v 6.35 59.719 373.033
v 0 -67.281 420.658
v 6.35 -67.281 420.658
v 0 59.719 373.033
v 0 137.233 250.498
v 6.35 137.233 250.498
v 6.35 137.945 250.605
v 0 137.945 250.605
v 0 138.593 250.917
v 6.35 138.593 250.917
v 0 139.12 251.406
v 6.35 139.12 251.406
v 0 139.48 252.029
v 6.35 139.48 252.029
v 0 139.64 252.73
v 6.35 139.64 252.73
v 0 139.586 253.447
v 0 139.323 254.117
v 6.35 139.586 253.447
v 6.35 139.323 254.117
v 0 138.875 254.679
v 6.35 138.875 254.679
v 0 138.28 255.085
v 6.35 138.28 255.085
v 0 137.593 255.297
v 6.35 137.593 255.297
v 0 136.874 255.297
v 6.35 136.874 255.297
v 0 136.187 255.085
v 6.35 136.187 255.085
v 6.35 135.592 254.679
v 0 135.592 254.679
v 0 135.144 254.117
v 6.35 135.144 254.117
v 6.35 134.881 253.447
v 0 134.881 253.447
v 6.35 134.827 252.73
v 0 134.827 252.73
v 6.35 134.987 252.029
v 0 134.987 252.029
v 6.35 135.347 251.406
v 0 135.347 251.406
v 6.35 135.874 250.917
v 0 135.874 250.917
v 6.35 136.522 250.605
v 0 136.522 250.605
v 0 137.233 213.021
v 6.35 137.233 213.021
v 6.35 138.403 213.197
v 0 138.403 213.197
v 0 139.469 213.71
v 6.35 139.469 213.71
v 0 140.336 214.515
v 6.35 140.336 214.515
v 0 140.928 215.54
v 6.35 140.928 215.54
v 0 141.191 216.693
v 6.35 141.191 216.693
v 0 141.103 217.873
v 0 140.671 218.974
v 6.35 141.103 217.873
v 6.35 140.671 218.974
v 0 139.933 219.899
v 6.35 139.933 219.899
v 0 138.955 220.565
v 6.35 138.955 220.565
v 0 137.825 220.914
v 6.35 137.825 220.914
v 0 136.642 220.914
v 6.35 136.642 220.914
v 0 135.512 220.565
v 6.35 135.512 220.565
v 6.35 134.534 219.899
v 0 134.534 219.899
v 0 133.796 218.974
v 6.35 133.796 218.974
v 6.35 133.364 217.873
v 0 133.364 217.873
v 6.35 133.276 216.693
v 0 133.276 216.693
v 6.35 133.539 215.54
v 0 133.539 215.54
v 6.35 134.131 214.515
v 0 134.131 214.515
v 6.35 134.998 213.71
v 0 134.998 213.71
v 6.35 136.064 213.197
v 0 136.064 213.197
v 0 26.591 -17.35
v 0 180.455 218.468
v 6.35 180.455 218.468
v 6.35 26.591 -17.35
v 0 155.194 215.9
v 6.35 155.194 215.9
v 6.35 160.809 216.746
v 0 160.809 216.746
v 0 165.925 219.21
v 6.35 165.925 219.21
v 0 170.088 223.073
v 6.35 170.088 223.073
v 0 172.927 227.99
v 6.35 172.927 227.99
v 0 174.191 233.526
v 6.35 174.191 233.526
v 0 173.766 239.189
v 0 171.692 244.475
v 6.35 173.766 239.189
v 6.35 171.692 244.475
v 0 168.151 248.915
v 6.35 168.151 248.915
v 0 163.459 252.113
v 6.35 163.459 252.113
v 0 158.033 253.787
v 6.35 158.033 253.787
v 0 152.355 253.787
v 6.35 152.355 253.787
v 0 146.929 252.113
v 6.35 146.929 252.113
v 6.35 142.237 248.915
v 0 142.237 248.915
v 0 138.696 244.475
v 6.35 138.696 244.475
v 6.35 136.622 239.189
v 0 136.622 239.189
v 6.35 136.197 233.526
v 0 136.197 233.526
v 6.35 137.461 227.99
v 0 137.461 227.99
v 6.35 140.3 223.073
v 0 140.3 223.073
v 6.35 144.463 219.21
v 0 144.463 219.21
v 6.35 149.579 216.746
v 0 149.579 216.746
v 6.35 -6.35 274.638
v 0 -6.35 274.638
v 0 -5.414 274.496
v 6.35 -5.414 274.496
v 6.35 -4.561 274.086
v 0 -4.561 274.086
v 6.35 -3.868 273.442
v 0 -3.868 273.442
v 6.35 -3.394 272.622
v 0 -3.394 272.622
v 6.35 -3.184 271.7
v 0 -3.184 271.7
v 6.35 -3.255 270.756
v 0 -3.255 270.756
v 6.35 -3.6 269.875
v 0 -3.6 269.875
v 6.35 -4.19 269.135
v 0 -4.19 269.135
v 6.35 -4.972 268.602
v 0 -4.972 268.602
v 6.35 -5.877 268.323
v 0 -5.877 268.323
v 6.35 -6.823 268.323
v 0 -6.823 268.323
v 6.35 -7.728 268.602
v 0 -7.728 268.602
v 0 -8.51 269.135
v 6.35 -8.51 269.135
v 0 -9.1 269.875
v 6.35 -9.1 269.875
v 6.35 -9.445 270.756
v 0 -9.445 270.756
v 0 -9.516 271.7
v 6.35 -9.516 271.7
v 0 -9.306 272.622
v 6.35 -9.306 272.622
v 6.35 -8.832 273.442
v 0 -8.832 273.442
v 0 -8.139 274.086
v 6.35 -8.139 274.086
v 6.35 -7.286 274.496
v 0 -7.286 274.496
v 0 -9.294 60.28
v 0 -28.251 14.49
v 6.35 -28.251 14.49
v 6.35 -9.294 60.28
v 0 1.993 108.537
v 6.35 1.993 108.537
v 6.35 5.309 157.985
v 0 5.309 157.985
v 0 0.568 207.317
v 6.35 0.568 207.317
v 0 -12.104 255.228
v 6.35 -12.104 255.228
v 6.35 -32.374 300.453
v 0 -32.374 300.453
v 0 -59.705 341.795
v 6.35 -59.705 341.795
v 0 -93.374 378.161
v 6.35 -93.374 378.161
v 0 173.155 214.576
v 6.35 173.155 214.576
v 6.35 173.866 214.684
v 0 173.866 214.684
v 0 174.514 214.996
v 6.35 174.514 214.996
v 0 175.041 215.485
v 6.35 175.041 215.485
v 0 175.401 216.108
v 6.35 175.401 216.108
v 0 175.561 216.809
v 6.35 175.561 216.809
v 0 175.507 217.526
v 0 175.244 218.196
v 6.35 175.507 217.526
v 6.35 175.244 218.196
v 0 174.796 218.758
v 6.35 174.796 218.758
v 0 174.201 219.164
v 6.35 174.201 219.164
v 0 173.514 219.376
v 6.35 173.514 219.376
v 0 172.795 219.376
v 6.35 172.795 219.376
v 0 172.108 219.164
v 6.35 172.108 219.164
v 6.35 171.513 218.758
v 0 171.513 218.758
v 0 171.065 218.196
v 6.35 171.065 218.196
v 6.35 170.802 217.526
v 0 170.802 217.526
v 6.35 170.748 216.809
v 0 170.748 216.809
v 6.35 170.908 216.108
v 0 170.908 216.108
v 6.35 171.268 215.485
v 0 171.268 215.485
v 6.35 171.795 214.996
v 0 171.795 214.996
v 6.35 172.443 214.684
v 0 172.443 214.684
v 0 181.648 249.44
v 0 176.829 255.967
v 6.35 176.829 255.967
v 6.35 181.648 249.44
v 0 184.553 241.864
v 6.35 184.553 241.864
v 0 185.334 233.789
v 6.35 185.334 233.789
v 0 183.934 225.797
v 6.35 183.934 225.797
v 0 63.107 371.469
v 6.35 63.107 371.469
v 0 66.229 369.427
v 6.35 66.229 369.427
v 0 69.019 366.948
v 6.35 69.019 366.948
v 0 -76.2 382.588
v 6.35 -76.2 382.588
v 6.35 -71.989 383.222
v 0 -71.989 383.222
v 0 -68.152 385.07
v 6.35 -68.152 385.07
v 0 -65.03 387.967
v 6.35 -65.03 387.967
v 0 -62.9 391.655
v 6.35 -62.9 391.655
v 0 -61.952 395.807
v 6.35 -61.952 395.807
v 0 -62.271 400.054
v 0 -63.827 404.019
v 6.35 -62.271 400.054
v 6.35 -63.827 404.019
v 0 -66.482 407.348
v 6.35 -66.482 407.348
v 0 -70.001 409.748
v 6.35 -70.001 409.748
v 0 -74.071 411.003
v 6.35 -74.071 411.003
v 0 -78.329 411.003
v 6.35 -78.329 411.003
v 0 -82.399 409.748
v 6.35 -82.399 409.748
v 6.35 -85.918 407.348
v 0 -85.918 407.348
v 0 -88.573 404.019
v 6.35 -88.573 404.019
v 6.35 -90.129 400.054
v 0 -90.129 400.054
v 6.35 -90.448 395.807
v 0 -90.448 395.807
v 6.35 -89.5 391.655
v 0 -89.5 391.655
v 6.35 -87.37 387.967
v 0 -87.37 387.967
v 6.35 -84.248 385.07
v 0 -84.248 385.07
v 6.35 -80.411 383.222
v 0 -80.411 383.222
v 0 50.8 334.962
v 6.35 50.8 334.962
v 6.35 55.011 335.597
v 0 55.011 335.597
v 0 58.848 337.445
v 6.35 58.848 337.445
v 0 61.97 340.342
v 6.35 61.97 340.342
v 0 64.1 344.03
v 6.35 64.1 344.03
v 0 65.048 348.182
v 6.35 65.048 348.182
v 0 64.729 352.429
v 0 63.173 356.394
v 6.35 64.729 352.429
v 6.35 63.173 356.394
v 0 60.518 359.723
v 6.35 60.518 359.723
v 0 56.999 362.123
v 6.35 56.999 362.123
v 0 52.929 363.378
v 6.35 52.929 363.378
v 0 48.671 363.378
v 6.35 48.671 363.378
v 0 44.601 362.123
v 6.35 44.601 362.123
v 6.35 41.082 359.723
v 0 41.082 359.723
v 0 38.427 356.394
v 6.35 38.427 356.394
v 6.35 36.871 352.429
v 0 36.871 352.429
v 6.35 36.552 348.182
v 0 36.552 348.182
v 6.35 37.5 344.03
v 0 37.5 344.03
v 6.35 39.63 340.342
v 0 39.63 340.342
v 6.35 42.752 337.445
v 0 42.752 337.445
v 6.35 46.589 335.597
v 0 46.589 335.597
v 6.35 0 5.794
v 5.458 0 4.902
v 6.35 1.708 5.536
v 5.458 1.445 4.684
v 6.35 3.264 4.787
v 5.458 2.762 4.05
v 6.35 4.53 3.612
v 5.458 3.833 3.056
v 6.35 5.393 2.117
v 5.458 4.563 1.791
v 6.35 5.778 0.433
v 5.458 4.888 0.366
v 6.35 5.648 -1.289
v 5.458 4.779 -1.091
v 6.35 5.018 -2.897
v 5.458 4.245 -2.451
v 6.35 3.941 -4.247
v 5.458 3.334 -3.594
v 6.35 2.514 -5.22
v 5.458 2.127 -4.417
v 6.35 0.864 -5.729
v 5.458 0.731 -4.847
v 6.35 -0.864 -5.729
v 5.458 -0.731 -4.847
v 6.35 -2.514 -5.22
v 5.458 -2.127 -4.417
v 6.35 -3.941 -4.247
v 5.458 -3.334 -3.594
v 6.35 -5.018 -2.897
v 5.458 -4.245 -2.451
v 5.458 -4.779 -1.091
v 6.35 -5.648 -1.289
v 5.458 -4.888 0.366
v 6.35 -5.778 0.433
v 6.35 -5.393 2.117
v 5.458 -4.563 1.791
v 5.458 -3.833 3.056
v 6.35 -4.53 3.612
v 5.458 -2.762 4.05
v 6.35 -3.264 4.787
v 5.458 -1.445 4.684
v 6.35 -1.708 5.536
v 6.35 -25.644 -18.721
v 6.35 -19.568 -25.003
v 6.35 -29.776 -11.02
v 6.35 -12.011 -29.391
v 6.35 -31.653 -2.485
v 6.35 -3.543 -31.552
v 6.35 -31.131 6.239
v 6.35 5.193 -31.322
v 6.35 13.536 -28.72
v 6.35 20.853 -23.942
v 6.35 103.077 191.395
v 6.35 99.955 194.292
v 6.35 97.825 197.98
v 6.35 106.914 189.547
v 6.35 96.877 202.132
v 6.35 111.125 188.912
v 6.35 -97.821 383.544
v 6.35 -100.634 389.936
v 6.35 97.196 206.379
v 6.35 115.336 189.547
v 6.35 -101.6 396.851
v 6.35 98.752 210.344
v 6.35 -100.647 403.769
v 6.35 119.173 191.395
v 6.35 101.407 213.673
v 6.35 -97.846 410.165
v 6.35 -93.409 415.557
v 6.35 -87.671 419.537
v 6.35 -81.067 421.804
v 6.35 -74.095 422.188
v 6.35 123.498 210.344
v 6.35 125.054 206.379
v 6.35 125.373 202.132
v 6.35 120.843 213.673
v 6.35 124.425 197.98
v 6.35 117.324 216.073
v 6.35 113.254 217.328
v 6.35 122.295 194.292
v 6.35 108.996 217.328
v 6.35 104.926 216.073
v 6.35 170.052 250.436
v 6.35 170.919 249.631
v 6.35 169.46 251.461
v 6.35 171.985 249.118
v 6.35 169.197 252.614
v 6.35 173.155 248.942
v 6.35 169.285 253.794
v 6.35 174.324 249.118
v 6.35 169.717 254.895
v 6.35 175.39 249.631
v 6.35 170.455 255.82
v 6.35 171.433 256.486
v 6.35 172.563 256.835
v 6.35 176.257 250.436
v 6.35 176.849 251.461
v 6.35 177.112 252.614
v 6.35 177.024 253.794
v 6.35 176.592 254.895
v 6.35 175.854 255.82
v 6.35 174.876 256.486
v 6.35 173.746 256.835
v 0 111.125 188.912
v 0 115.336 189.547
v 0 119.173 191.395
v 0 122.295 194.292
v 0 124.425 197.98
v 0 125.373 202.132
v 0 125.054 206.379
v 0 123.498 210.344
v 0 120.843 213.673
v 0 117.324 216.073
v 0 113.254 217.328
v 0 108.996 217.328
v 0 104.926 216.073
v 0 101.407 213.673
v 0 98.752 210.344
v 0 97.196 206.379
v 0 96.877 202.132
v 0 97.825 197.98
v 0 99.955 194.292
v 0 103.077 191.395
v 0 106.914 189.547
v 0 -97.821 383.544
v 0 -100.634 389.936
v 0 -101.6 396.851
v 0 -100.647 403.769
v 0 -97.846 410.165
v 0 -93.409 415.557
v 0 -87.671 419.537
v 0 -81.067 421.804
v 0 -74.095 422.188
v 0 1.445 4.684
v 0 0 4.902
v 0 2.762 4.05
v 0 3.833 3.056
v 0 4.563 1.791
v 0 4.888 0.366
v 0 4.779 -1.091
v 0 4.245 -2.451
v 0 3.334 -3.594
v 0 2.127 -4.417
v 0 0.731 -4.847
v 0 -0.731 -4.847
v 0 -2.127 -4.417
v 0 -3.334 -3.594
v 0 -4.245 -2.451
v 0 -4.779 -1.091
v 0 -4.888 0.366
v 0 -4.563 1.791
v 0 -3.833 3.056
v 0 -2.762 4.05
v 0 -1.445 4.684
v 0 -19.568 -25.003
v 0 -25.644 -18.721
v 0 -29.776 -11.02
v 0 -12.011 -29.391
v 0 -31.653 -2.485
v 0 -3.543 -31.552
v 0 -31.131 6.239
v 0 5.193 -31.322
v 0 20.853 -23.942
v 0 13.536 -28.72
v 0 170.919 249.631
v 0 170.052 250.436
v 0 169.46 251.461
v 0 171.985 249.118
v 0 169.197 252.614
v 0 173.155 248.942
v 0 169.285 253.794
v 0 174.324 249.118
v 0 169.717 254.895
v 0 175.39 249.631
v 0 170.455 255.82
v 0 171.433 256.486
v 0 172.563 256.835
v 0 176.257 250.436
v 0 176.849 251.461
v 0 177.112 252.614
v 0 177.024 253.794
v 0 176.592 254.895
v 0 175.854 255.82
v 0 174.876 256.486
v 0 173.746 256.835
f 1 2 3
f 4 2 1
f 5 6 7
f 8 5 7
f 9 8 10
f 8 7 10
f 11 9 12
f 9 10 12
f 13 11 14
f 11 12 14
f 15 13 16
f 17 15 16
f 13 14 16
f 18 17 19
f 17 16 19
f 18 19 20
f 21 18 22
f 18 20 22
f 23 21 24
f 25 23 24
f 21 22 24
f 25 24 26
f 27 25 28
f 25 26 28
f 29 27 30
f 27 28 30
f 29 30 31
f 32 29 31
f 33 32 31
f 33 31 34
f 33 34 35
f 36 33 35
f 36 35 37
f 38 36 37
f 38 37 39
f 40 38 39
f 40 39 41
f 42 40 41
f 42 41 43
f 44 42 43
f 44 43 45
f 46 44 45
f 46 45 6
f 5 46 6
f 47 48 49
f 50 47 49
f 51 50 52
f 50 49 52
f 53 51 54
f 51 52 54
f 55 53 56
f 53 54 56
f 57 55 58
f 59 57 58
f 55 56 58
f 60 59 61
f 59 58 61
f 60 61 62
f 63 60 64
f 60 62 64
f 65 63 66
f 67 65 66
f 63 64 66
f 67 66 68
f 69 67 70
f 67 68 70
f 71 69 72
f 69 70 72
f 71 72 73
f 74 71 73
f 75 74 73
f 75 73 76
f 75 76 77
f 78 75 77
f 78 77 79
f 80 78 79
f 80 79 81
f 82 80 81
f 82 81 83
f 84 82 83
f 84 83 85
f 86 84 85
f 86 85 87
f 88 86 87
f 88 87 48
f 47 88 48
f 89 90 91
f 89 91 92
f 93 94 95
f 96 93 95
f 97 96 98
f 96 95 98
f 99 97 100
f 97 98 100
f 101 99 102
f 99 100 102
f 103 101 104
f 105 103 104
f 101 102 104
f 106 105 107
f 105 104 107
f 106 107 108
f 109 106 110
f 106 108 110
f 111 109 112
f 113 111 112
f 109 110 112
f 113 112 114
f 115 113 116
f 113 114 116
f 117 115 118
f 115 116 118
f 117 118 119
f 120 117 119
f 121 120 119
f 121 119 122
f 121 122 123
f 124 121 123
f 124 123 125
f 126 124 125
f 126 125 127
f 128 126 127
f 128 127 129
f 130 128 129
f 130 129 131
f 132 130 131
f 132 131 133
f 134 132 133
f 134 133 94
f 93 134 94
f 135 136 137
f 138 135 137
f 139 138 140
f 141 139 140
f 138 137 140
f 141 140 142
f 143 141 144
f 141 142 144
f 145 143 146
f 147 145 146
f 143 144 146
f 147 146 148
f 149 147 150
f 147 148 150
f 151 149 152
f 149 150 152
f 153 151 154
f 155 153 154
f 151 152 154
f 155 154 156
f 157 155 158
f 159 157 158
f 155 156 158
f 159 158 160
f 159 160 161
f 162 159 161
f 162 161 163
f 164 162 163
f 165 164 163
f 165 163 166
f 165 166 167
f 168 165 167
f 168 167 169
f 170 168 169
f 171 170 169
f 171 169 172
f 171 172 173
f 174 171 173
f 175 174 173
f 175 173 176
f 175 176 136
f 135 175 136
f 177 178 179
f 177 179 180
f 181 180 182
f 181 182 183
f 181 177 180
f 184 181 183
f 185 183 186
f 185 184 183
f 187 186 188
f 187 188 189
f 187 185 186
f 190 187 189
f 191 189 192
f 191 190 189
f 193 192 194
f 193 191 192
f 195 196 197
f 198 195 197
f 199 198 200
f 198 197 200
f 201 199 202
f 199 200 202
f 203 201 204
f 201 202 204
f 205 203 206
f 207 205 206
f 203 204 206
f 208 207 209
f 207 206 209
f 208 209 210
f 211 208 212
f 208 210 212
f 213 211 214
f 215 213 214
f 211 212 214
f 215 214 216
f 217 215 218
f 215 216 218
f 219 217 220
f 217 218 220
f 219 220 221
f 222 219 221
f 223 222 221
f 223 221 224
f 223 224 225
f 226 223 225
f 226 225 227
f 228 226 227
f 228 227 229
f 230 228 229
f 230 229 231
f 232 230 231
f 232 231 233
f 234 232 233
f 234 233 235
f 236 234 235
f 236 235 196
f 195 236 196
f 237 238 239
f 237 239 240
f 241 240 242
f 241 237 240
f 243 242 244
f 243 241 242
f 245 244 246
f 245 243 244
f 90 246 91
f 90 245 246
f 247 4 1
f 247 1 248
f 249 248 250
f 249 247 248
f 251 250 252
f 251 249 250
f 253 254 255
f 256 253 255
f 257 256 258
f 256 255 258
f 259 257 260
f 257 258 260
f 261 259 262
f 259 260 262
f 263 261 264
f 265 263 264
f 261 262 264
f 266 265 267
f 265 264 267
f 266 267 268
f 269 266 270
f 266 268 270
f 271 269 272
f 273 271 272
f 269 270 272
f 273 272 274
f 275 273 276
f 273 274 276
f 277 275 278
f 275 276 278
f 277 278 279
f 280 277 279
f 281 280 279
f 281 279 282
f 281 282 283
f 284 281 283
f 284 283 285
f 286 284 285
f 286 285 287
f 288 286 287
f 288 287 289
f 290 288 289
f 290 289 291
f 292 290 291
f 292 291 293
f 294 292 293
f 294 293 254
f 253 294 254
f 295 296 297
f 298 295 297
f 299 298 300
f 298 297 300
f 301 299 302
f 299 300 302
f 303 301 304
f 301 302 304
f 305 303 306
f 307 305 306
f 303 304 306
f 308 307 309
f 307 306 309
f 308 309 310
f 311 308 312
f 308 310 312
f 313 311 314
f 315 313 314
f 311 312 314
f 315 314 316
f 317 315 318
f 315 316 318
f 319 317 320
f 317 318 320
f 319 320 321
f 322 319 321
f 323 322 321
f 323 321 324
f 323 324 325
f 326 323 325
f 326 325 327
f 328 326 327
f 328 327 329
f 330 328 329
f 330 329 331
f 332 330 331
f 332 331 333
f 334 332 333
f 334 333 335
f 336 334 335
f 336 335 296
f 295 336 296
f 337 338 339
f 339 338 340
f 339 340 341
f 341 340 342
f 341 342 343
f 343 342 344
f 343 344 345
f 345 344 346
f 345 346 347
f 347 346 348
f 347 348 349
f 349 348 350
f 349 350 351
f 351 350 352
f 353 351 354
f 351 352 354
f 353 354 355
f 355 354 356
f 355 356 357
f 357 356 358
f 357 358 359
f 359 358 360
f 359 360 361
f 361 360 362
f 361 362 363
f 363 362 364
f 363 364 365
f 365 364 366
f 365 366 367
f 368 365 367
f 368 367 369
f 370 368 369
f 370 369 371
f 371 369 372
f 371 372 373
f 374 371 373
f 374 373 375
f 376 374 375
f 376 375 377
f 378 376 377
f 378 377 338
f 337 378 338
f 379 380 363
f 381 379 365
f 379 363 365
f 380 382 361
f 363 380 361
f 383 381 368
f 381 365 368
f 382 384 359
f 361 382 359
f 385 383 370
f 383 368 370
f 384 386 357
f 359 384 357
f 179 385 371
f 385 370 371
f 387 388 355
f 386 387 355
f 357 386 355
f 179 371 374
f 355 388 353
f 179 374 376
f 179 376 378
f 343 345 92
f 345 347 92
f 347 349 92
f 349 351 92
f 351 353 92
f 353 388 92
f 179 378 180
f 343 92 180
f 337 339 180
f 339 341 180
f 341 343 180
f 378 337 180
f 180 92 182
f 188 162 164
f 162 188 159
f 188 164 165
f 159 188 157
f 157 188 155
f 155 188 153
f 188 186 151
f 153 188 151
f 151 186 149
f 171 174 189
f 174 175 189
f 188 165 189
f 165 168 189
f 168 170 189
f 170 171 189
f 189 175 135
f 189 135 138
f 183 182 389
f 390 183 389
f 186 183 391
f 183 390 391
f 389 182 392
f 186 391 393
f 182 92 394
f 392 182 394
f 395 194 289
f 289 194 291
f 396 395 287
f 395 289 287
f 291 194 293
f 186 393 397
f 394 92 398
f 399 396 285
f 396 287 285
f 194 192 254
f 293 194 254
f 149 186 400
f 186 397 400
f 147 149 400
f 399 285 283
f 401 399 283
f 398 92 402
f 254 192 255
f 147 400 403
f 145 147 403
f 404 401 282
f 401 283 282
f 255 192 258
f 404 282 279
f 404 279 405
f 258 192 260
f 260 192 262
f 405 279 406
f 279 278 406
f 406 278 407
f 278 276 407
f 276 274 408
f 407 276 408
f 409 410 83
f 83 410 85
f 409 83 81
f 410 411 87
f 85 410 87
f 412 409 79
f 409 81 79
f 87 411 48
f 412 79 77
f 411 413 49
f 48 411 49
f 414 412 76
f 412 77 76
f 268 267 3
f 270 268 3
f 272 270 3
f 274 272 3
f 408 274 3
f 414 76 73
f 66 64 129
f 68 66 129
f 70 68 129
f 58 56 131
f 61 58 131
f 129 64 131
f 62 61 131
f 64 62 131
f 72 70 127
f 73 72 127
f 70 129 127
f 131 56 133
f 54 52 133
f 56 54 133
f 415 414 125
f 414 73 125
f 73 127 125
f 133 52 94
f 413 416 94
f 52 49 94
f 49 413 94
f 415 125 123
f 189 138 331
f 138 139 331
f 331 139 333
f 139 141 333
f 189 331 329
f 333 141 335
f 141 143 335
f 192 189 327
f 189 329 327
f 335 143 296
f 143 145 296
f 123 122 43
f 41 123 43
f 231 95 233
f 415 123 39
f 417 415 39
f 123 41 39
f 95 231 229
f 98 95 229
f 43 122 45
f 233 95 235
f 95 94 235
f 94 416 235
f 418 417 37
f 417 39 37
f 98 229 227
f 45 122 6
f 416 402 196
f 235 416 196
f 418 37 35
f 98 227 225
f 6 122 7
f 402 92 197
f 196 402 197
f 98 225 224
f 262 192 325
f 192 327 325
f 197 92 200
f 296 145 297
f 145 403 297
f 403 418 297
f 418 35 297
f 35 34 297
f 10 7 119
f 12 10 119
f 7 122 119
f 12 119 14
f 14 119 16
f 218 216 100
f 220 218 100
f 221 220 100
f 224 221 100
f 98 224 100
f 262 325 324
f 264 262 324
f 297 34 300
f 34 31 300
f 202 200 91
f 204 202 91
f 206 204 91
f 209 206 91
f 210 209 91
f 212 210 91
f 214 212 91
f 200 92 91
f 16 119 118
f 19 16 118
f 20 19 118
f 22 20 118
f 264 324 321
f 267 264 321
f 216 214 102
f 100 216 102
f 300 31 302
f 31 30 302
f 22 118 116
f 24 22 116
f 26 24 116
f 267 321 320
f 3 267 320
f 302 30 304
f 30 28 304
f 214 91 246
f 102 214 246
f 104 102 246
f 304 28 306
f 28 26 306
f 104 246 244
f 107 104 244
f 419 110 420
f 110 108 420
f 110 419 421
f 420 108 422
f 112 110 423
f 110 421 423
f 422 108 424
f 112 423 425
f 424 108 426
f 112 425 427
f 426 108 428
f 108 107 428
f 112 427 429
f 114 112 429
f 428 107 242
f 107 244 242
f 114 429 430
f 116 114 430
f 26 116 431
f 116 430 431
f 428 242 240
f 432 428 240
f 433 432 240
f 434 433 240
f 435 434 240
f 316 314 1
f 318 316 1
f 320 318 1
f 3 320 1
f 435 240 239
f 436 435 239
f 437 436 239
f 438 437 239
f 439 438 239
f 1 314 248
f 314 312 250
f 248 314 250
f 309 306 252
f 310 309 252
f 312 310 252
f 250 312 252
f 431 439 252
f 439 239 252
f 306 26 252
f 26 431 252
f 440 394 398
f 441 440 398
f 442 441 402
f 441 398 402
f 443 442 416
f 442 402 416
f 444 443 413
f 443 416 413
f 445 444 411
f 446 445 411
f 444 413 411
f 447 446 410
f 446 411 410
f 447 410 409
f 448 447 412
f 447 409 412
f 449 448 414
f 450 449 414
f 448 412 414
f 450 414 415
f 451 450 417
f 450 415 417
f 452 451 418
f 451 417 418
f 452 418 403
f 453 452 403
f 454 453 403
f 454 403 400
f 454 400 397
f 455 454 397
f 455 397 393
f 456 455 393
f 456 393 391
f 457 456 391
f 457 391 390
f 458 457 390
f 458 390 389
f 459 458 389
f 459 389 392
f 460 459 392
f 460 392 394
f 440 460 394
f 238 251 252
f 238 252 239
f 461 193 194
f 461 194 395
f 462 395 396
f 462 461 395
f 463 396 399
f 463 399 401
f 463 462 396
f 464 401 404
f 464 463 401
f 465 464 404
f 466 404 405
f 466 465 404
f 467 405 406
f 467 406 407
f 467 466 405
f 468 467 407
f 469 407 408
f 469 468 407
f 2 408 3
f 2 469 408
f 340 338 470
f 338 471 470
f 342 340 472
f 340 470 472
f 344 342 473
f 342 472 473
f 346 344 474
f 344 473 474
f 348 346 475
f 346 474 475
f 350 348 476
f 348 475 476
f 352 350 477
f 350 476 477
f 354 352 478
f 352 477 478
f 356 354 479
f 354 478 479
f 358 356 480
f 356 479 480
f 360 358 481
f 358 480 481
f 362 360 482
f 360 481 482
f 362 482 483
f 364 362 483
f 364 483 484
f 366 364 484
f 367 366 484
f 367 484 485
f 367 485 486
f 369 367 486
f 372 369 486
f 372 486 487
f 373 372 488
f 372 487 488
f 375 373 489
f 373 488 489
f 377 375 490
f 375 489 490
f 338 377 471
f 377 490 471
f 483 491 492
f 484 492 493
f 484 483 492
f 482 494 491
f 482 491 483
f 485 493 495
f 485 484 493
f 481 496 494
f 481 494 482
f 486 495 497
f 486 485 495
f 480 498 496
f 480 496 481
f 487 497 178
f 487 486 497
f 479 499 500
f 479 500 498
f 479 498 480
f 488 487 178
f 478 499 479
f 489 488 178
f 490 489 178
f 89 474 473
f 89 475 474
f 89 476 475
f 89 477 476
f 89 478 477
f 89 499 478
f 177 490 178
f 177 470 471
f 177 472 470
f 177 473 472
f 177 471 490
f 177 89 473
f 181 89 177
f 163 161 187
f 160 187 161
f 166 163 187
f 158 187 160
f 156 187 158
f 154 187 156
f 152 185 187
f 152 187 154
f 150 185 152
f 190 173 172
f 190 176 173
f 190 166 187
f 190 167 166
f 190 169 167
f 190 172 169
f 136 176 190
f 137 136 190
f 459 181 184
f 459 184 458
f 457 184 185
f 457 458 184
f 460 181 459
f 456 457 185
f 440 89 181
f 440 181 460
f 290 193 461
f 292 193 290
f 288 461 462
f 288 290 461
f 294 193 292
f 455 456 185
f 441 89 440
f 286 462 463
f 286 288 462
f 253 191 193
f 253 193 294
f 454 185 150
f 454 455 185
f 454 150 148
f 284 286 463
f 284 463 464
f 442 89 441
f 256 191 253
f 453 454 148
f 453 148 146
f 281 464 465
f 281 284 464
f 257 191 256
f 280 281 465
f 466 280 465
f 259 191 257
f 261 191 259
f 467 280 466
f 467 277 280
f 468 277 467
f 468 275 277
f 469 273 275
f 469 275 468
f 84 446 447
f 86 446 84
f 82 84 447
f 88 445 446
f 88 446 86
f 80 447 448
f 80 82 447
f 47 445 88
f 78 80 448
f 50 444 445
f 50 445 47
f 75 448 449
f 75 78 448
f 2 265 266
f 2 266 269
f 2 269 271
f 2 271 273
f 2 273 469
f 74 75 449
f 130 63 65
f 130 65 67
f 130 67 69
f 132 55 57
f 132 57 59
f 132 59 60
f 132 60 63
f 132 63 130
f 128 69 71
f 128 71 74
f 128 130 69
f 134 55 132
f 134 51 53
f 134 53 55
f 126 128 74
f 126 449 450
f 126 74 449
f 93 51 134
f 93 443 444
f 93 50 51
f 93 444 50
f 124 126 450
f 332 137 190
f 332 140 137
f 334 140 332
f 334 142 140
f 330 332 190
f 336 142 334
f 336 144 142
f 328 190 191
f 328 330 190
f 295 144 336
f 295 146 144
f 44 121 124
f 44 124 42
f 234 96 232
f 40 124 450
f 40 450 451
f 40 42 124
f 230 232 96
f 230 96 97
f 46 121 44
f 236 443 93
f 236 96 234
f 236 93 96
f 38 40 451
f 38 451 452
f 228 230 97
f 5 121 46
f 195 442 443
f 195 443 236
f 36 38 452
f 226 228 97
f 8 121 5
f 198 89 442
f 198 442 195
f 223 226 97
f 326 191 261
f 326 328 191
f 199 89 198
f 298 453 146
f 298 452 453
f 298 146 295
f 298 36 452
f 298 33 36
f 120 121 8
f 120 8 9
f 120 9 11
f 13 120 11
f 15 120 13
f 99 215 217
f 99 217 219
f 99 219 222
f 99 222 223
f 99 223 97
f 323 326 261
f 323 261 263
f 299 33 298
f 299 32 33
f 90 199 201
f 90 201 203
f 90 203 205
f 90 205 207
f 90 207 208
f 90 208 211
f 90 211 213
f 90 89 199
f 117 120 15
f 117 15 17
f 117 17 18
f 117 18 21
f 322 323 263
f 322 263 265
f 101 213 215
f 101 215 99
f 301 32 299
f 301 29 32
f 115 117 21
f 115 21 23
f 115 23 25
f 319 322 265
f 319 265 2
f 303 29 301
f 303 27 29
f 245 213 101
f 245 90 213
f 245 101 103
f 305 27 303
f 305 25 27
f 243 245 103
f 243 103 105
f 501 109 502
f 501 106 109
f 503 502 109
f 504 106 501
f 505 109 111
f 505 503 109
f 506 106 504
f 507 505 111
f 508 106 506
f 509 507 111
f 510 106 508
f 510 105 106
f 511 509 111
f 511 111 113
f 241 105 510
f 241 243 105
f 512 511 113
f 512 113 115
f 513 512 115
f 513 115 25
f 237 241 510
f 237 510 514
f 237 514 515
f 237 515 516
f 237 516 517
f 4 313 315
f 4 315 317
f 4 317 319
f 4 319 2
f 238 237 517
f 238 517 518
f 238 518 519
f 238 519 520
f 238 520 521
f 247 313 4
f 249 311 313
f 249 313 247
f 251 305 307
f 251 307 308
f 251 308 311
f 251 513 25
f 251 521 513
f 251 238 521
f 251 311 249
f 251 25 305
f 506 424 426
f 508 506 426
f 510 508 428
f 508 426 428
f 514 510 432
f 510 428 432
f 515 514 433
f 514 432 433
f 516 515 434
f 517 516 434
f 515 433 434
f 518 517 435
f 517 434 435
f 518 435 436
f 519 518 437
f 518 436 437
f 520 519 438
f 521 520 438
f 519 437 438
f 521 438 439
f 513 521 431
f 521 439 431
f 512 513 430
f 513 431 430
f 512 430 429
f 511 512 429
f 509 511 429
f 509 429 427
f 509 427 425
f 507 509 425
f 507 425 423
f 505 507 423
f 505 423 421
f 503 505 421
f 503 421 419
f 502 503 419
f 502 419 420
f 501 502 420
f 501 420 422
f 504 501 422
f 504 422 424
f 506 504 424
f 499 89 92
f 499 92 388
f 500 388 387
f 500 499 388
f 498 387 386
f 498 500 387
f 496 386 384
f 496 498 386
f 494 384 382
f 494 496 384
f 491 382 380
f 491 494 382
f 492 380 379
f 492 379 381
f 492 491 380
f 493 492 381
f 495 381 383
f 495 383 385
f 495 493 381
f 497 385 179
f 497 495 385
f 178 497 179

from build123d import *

# Parameters (mm, degrees)
BOSS_EXTRUDE1_DEPTH               = 6.35
CUT_EXTRUDE1_REACH                = 463.209
SKETCH3_R                         = 14.2875
SKETCH3_R_2                       = 19.05
SKETCH3_R_3                       = 2.413
SKETCH3_R_4                       = 3.96875
F_3_8_CLEARANCE_HOLE2_D           = 9.8044
F_3_8_CLEARANCE_HOLE2_CSINK_D     = 11.58748
F_3_8_CLEARANCE_HOLE2_CSINK_ANGLE = 90
F_1_4_0_2500_DOWEL_HOLE2_D        = 6.35


with BuildPart() as part:
    # Sketch2 → Boss-Extrude1 (new body)
    with BuildSketch(Plane(origin=(0, 0, 0), x_dir=(0, 0, -1), z_dir=(1, 0, 0))):
        with BuildLine():
            Line((-420.65776111, -67.281464584), (-373.03276111, 59.718535416))
            ThreePointArc((-373.03276111, 59.718535416), (-370.505449055, 64.705606261), (-366.948304567, 69.018946606))
            Line((-366.948304567, 69.018946606), (-255.966736674, 176.828999095))
            ThreePointArc((-255.966736674, 176.828999095), (-237.853043868, 185.216470627), (-218.467902472, 180.454975186))
            Line((-218.467902472, 180.454975186), (17.349576345, 26.590500195))
            ThreePointArc((17.349576345, 26.590500195), (27.457947121, -15.941255906), (-14.489671706, -28.250874568))
            ThreePointArc((-14.489671706, -28.250874568), (-207.31672278, 0.568286884), (-378.160809237, -93.373790032))
            ThreePointArc((-378.160809237, -93.373790032), (-410.165032474, -97.845670164), (-420.65776111, -67.281464584))
        make_face()
    extrude(amount=BOSS_EXTRUDE1_DEPTH)

    # Sketch3 → Cut-Extrude1 (cut, up to next)
    with BuildSketch(Plane(origin=(6.35, 0, 0), x_dir=(0, 0, -1), z_dir=(1, 0, 0)), mode=Mode.PRIVATE) as cut_extrude1_sk1:
        with Locations((-203.2, 111.125)):
            Circle(SKETCH3_R)
    cut_extrude1_tool1 = extrude(cut_extrude1_sk1.sketch, amount=-CUT_EXTRUDE1_REACH, mode=Mode.PRIVATE) & part.part
    # Sketch3 → Cut-Extrude1 (cut, up to next)
    with BuildSketch(Plane(origin=(6.35, 0, 0), x_dir=(0, 0, -1), z_dir=(1, 0, 0)), mode=Mode.PRIVATE) as cut_extrude1_sk2:
        with Locations((-349.25, 50.8)):
            Circle(SKETCH3_R)
    cut_extrude1_tool2 = extrude(cut_extrude1_sk2.sketch, amount=-CUT_EXTRUDE1_REACH, mode=Mode.PRIVATE) & part.part
    # Sketch3 → Cut-Extrude1 (cut, up to next)
    with BuildSketch(Plane(origin=(6.35, 0, 0), x_dir=(0, 0, -1), z_dir=(1, 0, 0)), mode=Mode.PRIVATE) as cut_extrude1_sk3:
        with Locations((-396.875, -76.2)):
            Circle(SKETCH3_R)
    cut_extrude1_tool3 = extrude(cut_extrude1_sk3.sketch, amount=-CUT_EXTRUDE1_REACH, mode=Mode.PRIVATE) & part.part
    # Sketch3 → Cut-Extrude1 (cut, up to next)
    with BuildSketch(Plane(origin=(6.35, 0, 0), x_dir=(0, 0, -1), z_dir=(1, 0, 0)), mode=Mode.PRIVATE) as cut_extrude1_sk4:
        with Locations((-234.95, 155.194)):
            Circle(SKETCH3_R_2)
    cut_extrude1_tool4 = extrude(cut_extrude1_sk4.sketch, amount=-CUT_EXTRUDE1_REACH, mode=Mode.PRIVATE) & part.part
    # Sketch3 → Cut-Extrude1 (cut, up to next)
    with BuildSketch(Plane(origin=(6.35, 0, 0), x_dir=(0, 0, -1), z_dir=(1, 0, 0)), mode=Mode.PRIVATE) as cut_extrude1_sk5:
        with Locations((-252.910512242, 137.233487758)):
            Circle(SKETCH3_R_3)
    cut_extrude1_tool5 = extrude(cut_extrude1_sk5.sketch, amount=-CUT_EXTRUDE1_REACH, mode=Mode.PRIVATE) & part.part
    # Sketch3 → Cut-Extrude1 (cut, up to next)
    with BuildSketch(Plane(origin=(6.35, 0, 0), x_dir=(0, 0, -1), z_dir=(1, 0, 0)), mode=Mode.PRIVATE) as cut_extrude1_sk6:
        with Locations((-216.989487758, 137.233487758)):
            Circle(SKETCH3_R_4)
    cut_extrude1_tool6 = extrude(cut_extrude1_sk6.sketch, amount=-CUT_EXTRUDE1_REACH, mode=Mode.PRIVATE) & part.part
    # Sketch3 → Cut-Extrude1 (cut, up to next)
    with BuildSketch(Plane(origin=(6.35, 0, 0), x_dir=(0, 0, -1), z_dir=(1, 0, 0)), mode=Mode.PRIVATE) as cut_extrude1_sk7:
        with Locations((-216.989487758, 173.154512242)):
            Circle(SKETCH3_R_3)
    cut_extrude1_tool7 = extrude(cut_extrude1_sk7.sketch, amount=-CUT_EXTRUDE1_REACH, mode=Mode.PRIVATE) & part.part
    # Sketch3 → Cut-Extrude1 (cut, up to next)
    with BuildSketch(Plane(origin=(6.35, 0, 0), x_dir=(0, 0, -1), z_dir=(1, 0, 0)), mode=Mode.PRIVATE) as cut_extrude1_sk8:
        with Locations((-252.910512242, 173.154512242)):
            Circle(SKETCH3_R_4)
    cut_extrude1_tool8 = extrude(cut_extrude1_sk8.sketch, amount=-CUT_EXTRUDE1_REACH, mode=Mode.PRIVATE) & part.part
    add(cut_extrude1_tool1.solids().sort_by_distance((6.35, 111.125, 203.2))[0], mode=Mode.SUBTRACT)
    add(cut_extrude1_tool2.solids().sort_by_distance((6.35, 50.8, 349.25))[0], mode=Mode.SUBTRACT)
    add(cut_extrude1_tool3.solids().sort_by_distance((6.35, -76.2, 396.875))[0], mode=Mode.SUBTRACT)
    add(cut_extrude1_tool4.solids().sort_by_distance((6.35, 155.194, 234.95))[0], mode=Mode.SUBTRACT)
    add(cut_extrude1_tool5.solids().sort_by_distance((6.35, 137.233488, 252.910512))[0], mode=Mode.SUBTRACT)
    add(cut_extrude1_tool6.solids().sort_by_distance((6.35, 137.233488, 216.989488))[0], mode=Mode.SUBTRACT)
    add(cut_extrude1_tool7.solids().sort_by_distance((6.35, 173.154512, 216.989488))[0], mode=Mode.SUBTRACT)
    add(cut_extrude1_tool8.solids().sort_by_distance((6.35, 173.154512, 252.910512))[0], mode=Mode.SUBTRACT)

    # 3/8 Clearance Hole2 (through all)
    with Locations(Plane(origin=(6.35, 0, 0), x_dir=(0, 0, -1), z_dir=(1, 0, 0))):
        with Locations((0, 0)):
            CounterSinkHole(F_3_8_CLEARANCE_HOLE2_D / 2, F_3_8_CLEARANCE_HOLE2_CSINK_D / 2, counter_sink_angle=F_3_8_CLEARANCE_HOLE2_CSINK_ANGLE)

    # 1/4 (0.2500) Dowel Hole2 (through all)
    with Locations(Plane(origin=(6.35, 0, 0), x_dir=(0, 0, -1), z_dir=(1, 0, 0))):
        with Locations((-271.4625, -6.35)):
            Hole(F_1_4_0_2500_DOWEL_HOLE2_D / 2)


solid = part.part
